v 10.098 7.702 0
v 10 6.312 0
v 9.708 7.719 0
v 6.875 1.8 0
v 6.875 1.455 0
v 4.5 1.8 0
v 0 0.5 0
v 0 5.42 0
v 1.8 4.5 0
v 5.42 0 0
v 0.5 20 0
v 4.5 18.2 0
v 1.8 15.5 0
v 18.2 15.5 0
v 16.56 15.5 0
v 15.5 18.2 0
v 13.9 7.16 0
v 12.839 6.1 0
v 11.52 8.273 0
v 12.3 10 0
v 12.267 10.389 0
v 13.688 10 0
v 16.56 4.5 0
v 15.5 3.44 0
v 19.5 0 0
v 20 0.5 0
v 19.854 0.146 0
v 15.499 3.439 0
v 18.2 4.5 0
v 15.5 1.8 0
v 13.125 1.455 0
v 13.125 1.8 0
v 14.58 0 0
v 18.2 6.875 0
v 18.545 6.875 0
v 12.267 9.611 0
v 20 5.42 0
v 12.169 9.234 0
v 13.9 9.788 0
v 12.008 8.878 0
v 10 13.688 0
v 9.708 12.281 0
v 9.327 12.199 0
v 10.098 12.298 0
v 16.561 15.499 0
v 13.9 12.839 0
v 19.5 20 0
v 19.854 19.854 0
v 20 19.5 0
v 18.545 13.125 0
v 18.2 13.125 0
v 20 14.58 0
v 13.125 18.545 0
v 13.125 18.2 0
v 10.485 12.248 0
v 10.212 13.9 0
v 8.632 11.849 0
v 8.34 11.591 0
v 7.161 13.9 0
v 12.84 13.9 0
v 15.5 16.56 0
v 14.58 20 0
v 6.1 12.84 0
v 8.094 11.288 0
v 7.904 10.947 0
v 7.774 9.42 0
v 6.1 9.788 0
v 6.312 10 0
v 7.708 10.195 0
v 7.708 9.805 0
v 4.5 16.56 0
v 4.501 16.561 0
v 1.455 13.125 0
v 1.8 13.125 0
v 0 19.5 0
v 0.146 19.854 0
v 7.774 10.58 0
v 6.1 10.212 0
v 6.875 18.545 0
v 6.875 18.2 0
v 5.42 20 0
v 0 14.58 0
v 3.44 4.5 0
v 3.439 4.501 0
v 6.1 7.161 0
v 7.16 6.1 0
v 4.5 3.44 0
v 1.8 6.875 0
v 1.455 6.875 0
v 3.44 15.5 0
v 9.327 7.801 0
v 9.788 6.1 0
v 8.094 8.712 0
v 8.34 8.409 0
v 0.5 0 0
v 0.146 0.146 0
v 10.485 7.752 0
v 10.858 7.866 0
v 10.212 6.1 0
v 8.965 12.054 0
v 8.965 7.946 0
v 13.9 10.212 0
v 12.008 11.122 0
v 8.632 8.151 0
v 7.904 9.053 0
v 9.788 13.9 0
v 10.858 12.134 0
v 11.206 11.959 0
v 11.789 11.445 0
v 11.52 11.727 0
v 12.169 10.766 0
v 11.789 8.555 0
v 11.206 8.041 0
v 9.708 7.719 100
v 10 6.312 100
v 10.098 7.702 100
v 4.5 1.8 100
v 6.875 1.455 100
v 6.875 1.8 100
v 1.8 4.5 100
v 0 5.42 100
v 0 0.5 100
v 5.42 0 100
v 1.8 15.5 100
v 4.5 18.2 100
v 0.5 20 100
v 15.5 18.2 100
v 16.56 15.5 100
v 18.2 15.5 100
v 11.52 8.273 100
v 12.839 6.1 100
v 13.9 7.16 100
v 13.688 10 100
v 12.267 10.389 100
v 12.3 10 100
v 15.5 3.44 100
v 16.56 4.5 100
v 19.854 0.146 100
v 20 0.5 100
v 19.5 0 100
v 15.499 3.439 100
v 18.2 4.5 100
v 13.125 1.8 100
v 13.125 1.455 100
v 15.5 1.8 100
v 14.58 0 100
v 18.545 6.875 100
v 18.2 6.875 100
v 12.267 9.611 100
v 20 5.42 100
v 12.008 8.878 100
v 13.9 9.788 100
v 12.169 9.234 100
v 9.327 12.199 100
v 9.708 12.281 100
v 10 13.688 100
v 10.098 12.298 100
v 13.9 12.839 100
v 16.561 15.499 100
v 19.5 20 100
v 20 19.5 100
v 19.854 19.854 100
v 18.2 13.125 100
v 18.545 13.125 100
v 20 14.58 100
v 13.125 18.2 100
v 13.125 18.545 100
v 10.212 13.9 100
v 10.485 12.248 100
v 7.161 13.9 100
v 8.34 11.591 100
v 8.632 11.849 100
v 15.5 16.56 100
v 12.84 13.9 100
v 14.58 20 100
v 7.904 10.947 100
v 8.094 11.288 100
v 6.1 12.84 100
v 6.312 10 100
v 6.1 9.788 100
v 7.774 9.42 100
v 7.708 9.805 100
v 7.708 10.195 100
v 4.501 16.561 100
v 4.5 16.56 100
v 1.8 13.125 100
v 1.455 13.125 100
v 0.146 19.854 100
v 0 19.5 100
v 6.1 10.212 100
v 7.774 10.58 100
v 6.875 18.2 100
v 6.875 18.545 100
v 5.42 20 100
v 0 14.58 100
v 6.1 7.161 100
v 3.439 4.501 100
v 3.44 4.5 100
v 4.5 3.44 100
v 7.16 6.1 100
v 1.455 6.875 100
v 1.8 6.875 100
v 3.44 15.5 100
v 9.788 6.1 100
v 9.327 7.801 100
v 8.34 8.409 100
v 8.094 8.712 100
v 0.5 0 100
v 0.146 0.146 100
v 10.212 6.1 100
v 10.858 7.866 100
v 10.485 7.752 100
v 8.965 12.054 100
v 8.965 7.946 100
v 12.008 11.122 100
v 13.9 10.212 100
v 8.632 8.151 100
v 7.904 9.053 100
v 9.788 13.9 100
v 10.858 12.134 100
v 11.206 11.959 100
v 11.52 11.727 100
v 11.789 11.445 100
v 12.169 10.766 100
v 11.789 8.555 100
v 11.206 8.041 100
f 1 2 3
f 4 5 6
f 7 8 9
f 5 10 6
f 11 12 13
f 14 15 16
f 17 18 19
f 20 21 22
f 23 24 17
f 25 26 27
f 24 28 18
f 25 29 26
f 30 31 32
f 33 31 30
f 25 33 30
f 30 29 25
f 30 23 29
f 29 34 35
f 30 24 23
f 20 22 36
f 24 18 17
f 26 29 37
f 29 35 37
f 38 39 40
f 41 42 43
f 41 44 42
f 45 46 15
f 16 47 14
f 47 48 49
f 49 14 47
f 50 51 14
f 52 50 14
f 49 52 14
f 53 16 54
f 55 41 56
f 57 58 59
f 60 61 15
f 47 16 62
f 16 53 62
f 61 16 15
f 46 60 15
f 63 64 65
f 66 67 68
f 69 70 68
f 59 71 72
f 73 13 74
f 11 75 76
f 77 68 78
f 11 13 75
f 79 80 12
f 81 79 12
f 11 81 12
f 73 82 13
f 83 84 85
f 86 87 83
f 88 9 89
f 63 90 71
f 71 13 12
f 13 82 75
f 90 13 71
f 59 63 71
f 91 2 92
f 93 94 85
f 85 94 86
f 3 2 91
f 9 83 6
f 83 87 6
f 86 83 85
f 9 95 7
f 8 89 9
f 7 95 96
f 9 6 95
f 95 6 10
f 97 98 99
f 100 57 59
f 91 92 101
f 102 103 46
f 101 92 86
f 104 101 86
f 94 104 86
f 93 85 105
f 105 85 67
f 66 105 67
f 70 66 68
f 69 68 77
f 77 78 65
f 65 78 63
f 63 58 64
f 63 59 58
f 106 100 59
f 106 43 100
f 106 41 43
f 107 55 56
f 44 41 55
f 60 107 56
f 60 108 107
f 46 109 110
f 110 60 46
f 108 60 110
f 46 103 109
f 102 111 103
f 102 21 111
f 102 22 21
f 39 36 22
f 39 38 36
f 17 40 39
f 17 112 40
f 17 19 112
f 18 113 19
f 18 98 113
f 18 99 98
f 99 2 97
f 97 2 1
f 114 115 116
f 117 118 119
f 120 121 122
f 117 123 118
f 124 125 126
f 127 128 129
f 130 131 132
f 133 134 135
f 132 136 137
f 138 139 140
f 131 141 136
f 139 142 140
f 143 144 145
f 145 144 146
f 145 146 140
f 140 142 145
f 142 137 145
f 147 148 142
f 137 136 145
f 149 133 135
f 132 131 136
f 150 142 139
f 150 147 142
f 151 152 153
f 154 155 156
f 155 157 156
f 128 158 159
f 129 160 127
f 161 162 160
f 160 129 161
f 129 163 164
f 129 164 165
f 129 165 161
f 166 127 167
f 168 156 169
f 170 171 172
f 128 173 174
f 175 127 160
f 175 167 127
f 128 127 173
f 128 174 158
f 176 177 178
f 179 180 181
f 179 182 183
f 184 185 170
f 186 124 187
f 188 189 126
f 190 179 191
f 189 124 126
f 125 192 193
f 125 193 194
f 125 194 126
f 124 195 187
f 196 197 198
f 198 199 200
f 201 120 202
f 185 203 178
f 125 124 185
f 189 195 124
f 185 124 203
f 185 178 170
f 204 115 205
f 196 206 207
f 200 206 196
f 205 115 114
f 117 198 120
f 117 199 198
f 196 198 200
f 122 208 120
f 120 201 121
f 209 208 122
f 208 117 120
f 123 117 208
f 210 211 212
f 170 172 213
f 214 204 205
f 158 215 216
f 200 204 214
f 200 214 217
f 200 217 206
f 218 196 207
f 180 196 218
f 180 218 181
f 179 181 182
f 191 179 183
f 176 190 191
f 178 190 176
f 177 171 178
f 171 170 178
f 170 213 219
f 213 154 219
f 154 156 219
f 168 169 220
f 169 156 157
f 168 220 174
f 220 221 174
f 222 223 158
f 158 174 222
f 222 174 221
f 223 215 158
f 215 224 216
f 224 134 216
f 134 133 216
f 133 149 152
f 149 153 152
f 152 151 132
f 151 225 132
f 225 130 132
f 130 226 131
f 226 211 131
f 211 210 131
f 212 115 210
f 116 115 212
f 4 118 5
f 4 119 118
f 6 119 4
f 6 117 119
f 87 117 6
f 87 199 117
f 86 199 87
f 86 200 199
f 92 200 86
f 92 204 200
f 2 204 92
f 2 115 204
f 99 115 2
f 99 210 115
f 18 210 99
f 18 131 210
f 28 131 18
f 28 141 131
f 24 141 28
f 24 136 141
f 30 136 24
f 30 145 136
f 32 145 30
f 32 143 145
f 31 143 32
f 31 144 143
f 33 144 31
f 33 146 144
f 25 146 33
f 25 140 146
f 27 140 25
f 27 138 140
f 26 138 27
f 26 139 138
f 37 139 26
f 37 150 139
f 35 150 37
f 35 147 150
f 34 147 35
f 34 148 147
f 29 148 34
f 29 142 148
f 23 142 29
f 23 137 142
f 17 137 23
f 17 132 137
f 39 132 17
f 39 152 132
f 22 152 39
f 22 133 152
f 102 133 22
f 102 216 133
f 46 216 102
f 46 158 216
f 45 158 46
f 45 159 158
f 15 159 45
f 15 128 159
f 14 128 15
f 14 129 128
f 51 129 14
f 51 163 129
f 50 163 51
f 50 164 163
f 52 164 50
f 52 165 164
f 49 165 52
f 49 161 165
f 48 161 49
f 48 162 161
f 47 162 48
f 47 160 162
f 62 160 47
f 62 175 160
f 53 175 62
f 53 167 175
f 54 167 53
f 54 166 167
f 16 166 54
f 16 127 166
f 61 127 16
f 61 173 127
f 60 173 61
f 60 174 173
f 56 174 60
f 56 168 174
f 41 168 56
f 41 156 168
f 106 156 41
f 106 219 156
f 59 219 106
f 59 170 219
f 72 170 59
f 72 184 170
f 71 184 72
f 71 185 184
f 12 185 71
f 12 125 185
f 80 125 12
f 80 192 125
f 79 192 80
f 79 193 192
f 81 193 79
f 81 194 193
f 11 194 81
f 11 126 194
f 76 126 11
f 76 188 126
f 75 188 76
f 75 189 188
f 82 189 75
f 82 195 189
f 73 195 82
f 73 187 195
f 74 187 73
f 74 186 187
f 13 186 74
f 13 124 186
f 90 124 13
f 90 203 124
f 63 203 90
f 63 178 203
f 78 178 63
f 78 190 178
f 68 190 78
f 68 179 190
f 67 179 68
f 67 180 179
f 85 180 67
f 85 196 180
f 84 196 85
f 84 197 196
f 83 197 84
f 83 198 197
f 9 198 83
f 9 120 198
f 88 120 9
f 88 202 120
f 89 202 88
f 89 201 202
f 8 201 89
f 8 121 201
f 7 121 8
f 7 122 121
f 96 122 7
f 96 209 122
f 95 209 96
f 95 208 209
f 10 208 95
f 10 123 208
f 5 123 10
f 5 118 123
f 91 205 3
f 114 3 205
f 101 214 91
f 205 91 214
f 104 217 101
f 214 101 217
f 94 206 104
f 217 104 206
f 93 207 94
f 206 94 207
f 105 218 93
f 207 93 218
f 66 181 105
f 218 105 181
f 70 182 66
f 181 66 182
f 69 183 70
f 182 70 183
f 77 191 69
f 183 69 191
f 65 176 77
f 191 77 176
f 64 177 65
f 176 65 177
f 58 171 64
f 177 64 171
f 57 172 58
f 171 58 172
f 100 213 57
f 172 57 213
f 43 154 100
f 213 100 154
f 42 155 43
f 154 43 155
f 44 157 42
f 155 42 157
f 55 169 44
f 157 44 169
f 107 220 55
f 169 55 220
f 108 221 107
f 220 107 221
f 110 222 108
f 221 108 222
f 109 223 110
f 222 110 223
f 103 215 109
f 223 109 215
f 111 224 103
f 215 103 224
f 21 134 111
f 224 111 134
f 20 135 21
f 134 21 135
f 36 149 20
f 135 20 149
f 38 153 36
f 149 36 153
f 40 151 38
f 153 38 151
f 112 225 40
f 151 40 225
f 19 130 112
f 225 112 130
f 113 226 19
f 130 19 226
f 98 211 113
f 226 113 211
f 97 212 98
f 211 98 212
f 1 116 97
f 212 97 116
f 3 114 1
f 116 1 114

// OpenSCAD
$fa = 1.0;
$fs = 0.4;

module center(){
    difference(){
        translate([-3.9,-3.9,0]) square(7.8);
        circle(r=2.3);
        translate([0,3.688,0]) rotate([0,0,45]) square(0.3);
        translate([0,-4.112,0]) rotate([0,0,45]) square(0.3);
        translate([3.9,-0.212,0]) rotate([0,0,45]) square(0.3);
        translate([-3.9,-0.212,0]) rotate([0,0,45]) square(0.3);
        }
    }
 
 module corner(){
     translate([0.5,0.5,0]) circle(r=0.5);
     hull(){
         translate([0.5,0,0]) square([4.92,1.8]);
         translate([0.5,1.455,0]) square([6.375,0.345]);
     }
     hull(){
         translate([0,0.5,0]) square([1.8,4.92]);
         translate([1.455,0.5,0]) square([0.345,6.375]);
     }
     translate([1.8,1.8,0]) square(2.7);
     translate([4.5,3.44,0]) rotate([0,0,45]) square([3.763,1.5]);
 }
 
 module vslot(){
    corner();
    translate([20,0,0]) rotate([0,0,90]) corner();
    translate([20,20,0]) rotate([0,0,180]) corner();
    translate([0,20,0]) rotate([0,0,270]) corner();
    translate([10,10,0]) center();
     }
 
 // linear extrude height is desired length of v-slot
 linear_extrude(height=100) vslot();
